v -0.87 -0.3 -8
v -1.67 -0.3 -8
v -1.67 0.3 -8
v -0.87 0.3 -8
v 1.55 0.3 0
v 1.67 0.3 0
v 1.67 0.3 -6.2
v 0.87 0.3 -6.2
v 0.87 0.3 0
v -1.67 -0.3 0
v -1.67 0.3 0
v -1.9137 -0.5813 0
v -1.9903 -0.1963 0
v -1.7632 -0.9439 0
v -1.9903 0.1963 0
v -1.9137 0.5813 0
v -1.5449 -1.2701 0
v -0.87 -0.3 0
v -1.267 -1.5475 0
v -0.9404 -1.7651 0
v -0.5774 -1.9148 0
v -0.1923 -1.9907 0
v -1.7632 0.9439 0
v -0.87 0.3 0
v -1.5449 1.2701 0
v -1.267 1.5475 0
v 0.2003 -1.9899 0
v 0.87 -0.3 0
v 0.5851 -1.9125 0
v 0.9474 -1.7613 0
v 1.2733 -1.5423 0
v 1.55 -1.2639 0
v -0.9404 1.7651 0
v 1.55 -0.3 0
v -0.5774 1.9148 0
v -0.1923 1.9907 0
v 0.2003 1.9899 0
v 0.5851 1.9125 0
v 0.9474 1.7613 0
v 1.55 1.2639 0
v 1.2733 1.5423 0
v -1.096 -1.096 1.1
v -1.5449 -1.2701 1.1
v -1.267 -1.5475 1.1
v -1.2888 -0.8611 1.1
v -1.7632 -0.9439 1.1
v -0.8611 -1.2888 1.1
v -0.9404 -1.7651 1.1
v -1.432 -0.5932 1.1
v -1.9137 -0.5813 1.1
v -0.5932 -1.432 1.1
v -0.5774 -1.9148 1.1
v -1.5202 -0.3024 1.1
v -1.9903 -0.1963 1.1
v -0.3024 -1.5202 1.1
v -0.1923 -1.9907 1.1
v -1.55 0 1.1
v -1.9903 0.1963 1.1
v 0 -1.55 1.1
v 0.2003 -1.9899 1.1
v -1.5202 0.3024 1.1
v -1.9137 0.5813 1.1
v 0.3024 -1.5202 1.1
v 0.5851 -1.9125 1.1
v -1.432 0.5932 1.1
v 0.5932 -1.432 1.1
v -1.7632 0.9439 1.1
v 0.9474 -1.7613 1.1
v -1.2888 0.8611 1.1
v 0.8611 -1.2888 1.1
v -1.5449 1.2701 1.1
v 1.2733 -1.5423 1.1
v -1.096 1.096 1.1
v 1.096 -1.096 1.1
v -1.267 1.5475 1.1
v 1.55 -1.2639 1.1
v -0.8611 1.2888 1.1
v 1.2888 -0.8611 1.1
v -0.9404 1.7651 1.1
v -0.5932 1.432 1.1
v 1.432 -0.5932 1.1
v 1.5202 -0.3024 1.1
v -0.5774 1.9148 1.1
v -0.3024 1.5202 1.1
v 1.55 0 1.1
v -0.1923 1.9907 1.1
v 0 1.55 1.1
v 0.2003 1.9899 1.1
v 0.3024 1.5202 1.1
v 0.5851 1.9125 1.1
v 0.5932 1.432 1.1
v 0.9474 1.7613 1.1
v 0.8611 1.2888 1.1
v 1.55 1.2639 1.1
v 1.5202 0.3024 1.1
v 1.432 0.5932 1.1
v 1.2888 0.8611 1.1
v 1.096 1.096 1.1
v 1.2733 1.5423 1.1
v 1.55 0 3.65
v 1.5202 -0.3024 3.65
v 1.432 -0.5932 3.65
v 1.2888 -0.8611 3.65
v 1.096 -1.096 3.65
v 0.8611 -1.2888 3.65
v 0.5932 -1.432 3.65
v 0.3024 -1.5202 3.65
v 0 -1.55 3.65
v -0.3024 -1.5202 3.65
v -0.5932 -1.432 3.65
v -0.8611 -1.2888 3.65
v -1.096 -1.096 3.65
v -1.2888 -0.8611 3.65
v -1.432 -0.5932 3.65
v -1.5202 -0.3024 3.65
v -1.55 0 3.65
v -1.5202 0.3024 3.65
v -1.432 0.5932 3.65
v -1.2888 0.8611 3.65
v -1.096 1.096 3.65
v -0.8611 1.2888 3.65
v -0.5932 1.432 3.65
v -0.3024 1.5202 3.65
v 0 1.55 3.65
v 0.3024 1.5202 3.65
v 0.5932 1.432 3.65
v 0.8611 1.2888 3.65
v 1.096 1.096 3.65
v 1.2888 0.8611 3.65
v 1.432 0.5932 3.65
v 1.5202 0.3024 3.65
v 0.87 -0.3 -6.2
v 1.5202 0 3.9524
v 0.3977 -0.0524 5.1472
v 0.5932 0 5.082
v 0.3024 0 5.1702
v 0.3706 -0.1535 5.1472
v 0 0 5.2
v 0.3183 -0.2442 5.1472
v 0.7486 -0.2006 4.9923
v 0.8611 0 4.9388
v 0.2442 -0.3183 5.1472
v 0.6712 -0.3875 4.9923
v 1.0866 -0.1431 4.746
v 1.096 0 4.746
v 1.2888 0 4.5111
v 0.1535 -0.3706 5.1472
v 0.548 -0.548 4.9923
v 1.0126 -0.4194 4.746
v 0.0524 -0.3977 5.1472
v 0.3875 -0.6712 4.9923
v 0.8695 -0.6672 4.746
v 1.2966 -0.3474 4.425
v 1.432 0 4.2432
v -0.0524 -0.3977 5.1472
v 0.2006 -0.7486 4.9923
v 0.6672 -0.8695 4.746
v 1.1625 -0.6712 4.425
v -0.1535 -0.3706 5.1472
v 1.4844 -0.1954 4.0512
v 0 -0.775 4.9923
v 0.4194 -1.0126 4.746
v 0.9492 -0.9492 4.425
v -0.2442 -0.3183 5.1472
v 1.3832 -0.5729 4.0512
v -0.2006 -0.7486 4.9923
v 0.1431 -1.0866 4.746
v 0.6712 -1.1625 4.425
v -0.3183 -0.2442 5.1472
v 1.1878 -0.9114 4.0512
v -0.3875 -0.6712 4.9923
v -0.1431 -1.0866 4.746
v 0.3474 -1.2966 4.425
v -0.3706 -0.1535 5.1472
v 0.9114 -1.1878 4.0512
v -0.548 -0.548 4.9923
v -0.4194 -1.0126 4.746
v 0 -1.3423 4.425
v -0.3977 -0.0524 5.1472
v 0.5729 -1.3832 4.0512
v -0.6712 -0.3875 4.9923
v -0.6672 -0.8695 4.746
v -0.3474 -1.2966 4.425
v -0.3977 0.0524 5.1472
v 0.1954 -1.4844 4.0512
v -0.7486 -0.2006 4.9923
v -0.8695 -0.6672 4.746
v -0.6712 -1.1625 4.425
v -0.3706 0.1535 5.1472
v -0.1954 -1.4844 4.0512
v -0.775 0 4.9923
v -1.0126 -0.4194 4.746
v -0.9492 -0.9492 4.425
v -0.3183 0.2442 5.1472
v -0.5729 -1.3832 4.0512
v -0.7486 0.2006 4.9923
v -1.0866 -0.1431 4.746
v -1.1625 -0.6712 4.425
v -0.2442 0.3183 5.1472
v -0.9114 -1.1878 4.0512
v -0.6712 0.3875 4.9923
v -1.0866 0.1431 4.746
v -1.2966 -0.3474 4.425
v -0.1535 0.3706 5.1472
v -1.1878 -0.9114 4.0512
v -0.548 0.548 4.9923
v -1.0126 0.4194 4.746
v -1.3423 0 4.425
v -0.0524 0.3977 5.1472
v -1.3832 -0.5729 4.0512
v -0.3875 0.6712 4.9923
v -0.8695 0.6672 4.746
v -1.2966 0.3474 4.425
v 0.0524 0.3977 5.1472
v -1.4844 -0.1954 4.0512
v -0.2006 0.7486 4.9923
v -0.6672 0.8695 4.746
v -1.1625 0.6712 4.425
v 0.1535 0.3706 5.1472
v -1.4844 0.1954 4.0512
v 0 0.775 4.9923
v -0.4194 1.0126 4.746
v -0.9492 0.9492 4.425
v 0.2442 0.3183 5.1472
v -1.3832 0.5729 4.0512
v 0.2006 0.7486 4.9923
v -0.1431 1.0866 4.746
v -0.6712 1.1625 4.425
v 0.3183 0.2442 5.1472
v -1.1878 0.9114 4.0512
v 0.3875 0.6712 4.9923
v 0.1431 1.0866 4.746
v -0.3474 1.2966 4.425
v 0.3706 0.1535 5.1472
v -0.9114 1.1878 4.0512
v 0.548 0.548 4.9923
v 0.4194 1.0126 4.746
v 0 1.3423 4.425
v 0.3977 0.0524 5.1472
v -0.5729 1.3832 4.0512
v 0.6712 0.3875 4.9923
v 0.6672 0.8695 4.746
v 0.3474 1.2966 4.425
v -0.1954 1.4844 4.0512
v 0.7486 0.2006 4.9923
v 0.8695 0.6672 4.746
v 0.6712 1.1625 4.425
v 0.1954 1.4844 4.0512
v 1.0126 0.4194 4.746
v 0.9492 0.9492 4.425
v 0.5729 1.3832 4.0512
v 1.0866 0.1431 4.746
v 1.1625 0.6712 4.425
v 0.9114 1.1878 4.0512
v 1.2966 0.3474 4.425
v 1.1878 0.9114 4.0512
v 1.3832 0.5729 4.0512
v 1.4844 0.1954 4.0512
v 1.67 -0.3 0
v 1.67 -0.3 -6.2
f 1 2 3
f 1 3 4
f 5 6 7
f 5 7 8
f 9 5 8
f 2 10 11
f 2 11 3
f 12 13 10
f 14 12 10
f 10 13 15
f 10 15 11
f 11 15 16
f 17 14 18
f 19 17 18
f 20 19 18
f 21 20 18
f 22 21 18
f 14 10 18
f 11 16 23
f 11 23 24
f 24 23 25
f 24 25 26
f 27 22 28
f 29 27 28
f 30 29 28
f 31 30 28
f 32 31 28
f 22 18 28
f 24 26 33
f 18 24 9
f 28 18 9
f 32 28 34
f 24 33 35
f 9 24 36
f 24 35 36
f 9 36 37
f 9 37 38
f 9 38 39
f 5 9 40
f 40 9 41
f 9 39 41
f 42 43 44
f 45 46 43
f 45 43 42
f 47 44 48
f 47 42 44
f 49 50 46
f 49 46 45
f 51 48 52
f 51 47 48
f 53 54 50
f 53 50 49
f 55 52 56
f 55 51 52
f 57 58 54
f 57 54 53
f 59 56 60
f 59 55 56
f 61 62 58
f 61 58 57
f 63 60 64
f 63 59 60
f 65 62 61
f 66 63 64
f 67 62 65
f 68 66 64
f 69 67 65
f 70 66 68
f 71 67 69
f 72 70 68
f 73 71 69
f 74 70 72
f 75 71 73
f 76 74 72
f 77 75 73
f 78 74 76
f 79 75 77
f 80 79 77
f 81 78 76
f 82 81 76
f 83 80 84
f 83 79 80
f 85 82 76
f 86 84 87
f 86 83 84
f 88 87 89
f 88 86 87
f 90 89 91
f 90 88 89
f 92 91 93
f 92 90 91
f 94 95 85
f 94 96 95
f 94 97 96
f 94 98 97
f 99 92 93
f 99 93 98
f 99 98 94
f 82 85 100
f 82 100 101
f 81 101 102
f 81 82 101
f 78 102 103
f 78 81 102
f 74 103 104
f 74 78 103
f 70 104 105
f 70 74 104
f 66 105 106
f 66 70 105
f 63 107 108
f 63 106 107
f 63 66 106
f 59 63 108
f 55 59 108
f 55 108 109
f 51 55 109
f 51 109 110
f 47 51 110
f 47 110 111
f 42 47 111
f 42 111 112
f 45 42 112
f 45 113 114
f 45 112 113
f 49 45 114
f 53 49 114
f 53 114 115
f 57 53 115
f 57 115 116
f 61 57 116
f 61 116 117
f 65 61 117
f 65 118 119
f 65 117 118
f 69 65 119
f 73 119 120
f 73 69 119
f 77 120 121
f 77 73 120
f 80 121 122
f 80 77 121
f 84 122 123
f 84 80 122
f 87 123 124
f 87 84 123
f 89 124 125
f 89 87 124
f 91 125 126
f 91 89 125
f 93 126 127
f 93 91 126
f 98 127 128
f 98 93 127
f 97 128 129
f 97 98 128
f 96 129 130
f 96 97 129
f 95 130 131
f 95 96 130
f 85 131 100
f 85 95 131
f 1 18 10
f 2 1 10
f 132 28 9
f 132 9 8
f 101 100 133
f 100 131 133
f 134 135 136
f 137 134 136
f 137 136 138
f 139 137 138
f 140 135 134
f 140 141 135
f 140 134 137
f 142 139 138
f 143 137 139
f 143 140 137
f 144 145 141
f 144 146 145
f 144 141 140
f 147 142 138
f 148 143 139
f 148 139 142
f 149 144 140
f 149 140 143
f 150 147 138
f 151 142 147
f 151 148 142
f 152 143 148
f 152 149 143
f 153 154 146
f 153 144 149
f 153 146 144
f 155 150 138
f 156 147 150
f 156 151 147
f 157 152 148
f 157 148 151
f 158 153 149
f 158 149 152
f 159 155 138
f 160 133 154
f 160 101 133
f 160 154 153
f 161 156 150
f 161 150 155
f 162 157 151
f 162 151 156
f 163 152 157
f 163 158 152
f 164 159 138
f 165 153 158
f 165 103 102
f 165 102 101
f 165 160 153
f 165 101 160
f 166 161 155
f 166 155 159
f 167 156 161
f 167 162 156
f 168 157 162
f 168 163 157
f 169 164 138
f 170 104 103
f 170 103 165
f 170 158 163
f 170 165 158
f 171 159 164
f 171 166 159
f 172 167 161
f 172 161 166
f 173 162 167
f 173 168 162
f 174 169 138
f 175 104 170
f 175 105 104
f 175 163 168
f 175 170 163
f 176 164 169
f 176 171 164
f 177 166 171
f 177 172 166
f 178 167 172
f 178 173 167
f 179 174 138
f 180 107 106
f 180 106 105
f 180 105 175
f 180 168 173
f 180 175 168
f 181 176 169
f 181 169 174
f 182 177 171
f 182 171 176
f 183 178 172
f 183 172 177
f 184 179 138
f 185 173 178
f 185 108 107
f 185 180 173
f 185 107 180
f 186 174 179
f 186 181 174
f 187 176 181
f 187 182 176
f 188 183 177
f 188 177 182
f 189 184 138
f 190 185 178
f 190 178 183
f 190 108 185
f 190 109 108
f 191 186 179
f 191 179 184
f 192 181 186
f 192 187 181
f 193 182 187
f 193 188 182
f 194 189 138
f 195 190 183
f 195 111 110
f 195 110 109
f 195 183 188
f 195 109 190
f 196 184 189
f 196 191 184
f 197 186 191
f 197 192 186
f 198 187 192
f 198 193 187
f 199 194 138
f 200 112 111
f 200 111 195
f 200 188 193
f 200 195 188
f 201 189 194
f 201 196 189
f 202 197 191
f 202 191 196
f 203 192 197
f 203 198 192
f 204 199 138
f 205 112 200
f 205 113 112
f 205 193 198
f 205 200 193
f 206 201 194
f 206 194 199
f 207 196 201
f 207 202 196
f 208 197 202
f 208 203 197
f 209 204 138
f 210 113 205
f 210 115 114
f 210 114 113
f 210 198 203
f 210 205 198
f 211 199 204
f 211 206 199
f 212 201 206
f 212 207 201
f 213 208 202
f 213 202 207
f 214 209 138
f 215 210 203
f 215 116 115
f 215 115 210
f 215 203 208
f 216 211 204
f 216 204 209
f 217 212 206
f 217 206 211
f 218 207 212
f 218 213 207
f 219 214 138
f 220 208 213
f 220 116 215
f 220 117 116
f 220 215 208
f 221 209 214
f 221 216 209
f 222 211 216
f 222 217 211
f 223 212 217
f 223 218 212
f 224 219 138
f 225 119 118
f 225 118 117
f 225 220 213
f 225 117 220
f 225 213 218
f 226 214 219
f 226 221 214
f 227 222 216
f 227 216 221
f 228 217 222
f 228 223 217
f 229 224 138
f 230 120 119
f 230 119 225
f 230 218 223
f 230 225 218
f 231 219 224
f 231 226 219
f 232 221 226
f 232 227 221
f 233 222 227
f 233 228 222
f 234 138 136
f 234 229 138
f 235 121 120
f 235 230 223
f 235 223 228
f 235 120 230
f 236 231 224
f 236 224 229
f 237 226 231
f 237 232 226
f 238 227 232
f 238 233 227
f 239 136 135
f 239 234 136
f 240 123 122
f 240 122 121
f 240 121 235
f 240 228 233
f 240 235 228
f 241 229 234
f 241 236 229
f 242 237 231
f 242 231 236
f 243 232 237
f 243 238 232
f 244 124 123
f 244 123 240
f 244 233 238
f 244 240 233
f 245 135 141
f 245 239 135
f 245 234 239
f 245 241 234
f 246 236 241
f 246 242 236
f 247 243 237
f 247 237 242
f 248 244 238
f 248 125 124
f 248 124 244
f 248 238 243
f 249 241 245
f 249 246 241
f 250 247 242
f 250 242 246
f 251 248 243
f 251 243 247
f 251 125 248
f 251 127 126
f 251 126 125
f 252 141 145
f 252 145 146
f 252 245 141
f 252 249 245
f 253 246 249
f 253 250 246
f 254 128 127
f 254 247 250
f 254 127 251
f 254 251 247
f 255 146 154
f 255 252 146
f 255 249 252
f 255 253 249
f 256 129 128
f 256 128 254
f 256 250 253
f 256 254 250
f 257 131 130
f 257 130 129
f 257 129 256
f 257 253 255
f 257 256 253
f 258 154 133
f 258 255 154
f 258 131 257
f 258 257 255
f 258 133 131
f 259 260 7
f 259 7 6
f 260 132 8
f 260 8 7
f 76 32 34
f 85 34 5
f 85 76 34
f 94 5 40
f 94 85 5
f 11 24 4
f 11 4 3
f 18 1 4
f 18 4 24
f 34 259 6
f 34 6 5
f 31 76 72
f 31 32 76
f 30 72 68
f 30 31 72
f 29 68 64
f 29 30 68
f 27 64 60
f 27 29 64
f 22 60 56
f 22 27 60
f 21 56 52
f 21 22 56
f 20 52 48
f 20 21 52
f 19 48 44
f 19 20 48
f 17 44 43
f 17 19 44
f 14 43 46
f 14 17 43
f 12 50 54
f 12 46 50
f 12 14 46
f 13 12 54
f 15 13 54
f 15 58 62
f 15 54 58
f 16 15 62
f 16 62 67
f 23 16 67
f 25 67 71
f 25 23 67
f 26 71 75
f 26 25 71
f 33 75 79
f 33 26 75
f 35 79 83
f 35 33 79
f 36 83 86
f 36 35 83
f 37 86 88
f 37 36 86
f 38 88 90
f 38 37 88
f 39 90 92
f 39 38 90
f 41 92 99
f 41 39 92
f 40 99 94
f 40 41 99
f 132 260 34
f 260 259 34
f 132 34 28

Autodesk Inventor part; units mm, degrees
ref_plane "XZ Plane" through (0, 0, 0) normal (0, 1, 0) x (-1, 0, 0)
ref_plane "XY Plane" through (0, 0, 0) normal (0, 0, 1) x (1, 0, 0)
sketch "Skizze2" plane through (0, 0, 0) normal (0, 1, 0) x (-1, 0, 0)
  line L0 (0, 0) -> (0, 5.2)
  arc A0 (0, 5.2) -> (-1.55, 3.65) centre (0, 3.65) ccw
  line L1 (-1.55, 3.65) -> (-1.55, 1.1)
  line L2 (-1.55, 1.1) -> (-2, 1.1)
  line L3 (-2, 1.1) -> (-2, 0)
  line L4 (-2, 0) -> (0, 0)
  dimension "d0" = 5.2
  dimension "d1" = 3.1
  dimension "d2" = 4.1
  dimension "d3" = 4
revolve "Umdrehung1" add sketch "Skizze2" angle 360 about axis through (0, 0, 0) along (0, 0, 1)
ref_plane "Arbeitsebene1" through (1.55, 0, 2.375) normal (1, 0, 0) x (0, 1, 0)
sketch "Skizze3" plane through (1.55, 0, 2.375) normal (1, 0, 0) x (0, 1, 0)
  line L0 (2, -2.375) -> (-2, -2.375) projected
  line L1 (2, -1.275) -> (-2, -1.275) projected
  line L2 (2, -1.275) -> (-2, -1.275) projected
  line L3 (-2, -1.275) -> (2, -1.275)
  line L4 (2, -1.275) -> (2, -2.375)
  line L5 (2, -2.375) -> (-2, -2.375)
  line L6 (-2, -2.375) -> (-2, -1.275)
  point P0 (0, -2.375)
extrude "Extrusion1" cut sketch "Skizze3" along normal through all
sketch "Skizze4" plane through (0, 0, 0) normal (0, 1, 0) x (-1, 0, 0)
  line L0 (-1.55, 0) -> (-1.55, 0) projected
  line L1 (2, 0) -> (-1.55, 0) projected
  line L2 (0.87, 0) -> (1.67, 0)
  line L3 (1.67, 0) -> (1.67, -8)
  line L4 (1.67, -8) -> (0.87, -8)
  line L5 (0.87, -8) -> (0.87, 0)
  line L6 (-1.67, 0) -> (-0.87, 0)
  line L7 (-0.87, 0) -> (-0.87, -6.2)
  line L8 (-0.87, -6.2) -> (-1.67, -6.2)
  line L9 (-1.67, -6.2) -> (-1.67, 0)
  line L10 (0, -7.8775) -> (0, 7.3796) projected
  line L11 (1.27, -8) -> (1.27, 0) construction
  line L12 (-1.27, 0) -> (-1.27, -6.2) construction
  point P0 (0, 0)
  dimension "d7" = 0.8
  dimension "d8" = 0.8
  dimension "d9" = 2.54
  dimension "d10" = 1.8
  dimension "d11" = 8
extrude "Extrusion2" add sketch "Skizze4" along normal mid plane 0.6
sketch "Skizze5" plane through (0, 0, 0) normal (1, 0, 0) x (0, 1, 0)
  line L0 (0, 12.04) -> (0, -35.84) projected
  line L1 (0, 2.4) -> (0, 52.4)
  line L2 (0, 2.4) -> (18.1985, 52.4)
  line L3 (18.1985, 52.4) -> (0, 52.4)
  arc A0 (1.55, 3.65) -> (-1.55, 3.65) centre (0, 3.65) ccw projected
  line L4 (-3.0679, 5.2) -> (3.702, 5.2) construction
  point P0 (0, 0)
  dimension "d14" = 50
  dimension "d15" = 2.8
  dimension "d16" = 20
revolve "Umdrehung2" [suppressed]
properties part number "LED 3mm" material "PC/ABS-Kunststoff"
